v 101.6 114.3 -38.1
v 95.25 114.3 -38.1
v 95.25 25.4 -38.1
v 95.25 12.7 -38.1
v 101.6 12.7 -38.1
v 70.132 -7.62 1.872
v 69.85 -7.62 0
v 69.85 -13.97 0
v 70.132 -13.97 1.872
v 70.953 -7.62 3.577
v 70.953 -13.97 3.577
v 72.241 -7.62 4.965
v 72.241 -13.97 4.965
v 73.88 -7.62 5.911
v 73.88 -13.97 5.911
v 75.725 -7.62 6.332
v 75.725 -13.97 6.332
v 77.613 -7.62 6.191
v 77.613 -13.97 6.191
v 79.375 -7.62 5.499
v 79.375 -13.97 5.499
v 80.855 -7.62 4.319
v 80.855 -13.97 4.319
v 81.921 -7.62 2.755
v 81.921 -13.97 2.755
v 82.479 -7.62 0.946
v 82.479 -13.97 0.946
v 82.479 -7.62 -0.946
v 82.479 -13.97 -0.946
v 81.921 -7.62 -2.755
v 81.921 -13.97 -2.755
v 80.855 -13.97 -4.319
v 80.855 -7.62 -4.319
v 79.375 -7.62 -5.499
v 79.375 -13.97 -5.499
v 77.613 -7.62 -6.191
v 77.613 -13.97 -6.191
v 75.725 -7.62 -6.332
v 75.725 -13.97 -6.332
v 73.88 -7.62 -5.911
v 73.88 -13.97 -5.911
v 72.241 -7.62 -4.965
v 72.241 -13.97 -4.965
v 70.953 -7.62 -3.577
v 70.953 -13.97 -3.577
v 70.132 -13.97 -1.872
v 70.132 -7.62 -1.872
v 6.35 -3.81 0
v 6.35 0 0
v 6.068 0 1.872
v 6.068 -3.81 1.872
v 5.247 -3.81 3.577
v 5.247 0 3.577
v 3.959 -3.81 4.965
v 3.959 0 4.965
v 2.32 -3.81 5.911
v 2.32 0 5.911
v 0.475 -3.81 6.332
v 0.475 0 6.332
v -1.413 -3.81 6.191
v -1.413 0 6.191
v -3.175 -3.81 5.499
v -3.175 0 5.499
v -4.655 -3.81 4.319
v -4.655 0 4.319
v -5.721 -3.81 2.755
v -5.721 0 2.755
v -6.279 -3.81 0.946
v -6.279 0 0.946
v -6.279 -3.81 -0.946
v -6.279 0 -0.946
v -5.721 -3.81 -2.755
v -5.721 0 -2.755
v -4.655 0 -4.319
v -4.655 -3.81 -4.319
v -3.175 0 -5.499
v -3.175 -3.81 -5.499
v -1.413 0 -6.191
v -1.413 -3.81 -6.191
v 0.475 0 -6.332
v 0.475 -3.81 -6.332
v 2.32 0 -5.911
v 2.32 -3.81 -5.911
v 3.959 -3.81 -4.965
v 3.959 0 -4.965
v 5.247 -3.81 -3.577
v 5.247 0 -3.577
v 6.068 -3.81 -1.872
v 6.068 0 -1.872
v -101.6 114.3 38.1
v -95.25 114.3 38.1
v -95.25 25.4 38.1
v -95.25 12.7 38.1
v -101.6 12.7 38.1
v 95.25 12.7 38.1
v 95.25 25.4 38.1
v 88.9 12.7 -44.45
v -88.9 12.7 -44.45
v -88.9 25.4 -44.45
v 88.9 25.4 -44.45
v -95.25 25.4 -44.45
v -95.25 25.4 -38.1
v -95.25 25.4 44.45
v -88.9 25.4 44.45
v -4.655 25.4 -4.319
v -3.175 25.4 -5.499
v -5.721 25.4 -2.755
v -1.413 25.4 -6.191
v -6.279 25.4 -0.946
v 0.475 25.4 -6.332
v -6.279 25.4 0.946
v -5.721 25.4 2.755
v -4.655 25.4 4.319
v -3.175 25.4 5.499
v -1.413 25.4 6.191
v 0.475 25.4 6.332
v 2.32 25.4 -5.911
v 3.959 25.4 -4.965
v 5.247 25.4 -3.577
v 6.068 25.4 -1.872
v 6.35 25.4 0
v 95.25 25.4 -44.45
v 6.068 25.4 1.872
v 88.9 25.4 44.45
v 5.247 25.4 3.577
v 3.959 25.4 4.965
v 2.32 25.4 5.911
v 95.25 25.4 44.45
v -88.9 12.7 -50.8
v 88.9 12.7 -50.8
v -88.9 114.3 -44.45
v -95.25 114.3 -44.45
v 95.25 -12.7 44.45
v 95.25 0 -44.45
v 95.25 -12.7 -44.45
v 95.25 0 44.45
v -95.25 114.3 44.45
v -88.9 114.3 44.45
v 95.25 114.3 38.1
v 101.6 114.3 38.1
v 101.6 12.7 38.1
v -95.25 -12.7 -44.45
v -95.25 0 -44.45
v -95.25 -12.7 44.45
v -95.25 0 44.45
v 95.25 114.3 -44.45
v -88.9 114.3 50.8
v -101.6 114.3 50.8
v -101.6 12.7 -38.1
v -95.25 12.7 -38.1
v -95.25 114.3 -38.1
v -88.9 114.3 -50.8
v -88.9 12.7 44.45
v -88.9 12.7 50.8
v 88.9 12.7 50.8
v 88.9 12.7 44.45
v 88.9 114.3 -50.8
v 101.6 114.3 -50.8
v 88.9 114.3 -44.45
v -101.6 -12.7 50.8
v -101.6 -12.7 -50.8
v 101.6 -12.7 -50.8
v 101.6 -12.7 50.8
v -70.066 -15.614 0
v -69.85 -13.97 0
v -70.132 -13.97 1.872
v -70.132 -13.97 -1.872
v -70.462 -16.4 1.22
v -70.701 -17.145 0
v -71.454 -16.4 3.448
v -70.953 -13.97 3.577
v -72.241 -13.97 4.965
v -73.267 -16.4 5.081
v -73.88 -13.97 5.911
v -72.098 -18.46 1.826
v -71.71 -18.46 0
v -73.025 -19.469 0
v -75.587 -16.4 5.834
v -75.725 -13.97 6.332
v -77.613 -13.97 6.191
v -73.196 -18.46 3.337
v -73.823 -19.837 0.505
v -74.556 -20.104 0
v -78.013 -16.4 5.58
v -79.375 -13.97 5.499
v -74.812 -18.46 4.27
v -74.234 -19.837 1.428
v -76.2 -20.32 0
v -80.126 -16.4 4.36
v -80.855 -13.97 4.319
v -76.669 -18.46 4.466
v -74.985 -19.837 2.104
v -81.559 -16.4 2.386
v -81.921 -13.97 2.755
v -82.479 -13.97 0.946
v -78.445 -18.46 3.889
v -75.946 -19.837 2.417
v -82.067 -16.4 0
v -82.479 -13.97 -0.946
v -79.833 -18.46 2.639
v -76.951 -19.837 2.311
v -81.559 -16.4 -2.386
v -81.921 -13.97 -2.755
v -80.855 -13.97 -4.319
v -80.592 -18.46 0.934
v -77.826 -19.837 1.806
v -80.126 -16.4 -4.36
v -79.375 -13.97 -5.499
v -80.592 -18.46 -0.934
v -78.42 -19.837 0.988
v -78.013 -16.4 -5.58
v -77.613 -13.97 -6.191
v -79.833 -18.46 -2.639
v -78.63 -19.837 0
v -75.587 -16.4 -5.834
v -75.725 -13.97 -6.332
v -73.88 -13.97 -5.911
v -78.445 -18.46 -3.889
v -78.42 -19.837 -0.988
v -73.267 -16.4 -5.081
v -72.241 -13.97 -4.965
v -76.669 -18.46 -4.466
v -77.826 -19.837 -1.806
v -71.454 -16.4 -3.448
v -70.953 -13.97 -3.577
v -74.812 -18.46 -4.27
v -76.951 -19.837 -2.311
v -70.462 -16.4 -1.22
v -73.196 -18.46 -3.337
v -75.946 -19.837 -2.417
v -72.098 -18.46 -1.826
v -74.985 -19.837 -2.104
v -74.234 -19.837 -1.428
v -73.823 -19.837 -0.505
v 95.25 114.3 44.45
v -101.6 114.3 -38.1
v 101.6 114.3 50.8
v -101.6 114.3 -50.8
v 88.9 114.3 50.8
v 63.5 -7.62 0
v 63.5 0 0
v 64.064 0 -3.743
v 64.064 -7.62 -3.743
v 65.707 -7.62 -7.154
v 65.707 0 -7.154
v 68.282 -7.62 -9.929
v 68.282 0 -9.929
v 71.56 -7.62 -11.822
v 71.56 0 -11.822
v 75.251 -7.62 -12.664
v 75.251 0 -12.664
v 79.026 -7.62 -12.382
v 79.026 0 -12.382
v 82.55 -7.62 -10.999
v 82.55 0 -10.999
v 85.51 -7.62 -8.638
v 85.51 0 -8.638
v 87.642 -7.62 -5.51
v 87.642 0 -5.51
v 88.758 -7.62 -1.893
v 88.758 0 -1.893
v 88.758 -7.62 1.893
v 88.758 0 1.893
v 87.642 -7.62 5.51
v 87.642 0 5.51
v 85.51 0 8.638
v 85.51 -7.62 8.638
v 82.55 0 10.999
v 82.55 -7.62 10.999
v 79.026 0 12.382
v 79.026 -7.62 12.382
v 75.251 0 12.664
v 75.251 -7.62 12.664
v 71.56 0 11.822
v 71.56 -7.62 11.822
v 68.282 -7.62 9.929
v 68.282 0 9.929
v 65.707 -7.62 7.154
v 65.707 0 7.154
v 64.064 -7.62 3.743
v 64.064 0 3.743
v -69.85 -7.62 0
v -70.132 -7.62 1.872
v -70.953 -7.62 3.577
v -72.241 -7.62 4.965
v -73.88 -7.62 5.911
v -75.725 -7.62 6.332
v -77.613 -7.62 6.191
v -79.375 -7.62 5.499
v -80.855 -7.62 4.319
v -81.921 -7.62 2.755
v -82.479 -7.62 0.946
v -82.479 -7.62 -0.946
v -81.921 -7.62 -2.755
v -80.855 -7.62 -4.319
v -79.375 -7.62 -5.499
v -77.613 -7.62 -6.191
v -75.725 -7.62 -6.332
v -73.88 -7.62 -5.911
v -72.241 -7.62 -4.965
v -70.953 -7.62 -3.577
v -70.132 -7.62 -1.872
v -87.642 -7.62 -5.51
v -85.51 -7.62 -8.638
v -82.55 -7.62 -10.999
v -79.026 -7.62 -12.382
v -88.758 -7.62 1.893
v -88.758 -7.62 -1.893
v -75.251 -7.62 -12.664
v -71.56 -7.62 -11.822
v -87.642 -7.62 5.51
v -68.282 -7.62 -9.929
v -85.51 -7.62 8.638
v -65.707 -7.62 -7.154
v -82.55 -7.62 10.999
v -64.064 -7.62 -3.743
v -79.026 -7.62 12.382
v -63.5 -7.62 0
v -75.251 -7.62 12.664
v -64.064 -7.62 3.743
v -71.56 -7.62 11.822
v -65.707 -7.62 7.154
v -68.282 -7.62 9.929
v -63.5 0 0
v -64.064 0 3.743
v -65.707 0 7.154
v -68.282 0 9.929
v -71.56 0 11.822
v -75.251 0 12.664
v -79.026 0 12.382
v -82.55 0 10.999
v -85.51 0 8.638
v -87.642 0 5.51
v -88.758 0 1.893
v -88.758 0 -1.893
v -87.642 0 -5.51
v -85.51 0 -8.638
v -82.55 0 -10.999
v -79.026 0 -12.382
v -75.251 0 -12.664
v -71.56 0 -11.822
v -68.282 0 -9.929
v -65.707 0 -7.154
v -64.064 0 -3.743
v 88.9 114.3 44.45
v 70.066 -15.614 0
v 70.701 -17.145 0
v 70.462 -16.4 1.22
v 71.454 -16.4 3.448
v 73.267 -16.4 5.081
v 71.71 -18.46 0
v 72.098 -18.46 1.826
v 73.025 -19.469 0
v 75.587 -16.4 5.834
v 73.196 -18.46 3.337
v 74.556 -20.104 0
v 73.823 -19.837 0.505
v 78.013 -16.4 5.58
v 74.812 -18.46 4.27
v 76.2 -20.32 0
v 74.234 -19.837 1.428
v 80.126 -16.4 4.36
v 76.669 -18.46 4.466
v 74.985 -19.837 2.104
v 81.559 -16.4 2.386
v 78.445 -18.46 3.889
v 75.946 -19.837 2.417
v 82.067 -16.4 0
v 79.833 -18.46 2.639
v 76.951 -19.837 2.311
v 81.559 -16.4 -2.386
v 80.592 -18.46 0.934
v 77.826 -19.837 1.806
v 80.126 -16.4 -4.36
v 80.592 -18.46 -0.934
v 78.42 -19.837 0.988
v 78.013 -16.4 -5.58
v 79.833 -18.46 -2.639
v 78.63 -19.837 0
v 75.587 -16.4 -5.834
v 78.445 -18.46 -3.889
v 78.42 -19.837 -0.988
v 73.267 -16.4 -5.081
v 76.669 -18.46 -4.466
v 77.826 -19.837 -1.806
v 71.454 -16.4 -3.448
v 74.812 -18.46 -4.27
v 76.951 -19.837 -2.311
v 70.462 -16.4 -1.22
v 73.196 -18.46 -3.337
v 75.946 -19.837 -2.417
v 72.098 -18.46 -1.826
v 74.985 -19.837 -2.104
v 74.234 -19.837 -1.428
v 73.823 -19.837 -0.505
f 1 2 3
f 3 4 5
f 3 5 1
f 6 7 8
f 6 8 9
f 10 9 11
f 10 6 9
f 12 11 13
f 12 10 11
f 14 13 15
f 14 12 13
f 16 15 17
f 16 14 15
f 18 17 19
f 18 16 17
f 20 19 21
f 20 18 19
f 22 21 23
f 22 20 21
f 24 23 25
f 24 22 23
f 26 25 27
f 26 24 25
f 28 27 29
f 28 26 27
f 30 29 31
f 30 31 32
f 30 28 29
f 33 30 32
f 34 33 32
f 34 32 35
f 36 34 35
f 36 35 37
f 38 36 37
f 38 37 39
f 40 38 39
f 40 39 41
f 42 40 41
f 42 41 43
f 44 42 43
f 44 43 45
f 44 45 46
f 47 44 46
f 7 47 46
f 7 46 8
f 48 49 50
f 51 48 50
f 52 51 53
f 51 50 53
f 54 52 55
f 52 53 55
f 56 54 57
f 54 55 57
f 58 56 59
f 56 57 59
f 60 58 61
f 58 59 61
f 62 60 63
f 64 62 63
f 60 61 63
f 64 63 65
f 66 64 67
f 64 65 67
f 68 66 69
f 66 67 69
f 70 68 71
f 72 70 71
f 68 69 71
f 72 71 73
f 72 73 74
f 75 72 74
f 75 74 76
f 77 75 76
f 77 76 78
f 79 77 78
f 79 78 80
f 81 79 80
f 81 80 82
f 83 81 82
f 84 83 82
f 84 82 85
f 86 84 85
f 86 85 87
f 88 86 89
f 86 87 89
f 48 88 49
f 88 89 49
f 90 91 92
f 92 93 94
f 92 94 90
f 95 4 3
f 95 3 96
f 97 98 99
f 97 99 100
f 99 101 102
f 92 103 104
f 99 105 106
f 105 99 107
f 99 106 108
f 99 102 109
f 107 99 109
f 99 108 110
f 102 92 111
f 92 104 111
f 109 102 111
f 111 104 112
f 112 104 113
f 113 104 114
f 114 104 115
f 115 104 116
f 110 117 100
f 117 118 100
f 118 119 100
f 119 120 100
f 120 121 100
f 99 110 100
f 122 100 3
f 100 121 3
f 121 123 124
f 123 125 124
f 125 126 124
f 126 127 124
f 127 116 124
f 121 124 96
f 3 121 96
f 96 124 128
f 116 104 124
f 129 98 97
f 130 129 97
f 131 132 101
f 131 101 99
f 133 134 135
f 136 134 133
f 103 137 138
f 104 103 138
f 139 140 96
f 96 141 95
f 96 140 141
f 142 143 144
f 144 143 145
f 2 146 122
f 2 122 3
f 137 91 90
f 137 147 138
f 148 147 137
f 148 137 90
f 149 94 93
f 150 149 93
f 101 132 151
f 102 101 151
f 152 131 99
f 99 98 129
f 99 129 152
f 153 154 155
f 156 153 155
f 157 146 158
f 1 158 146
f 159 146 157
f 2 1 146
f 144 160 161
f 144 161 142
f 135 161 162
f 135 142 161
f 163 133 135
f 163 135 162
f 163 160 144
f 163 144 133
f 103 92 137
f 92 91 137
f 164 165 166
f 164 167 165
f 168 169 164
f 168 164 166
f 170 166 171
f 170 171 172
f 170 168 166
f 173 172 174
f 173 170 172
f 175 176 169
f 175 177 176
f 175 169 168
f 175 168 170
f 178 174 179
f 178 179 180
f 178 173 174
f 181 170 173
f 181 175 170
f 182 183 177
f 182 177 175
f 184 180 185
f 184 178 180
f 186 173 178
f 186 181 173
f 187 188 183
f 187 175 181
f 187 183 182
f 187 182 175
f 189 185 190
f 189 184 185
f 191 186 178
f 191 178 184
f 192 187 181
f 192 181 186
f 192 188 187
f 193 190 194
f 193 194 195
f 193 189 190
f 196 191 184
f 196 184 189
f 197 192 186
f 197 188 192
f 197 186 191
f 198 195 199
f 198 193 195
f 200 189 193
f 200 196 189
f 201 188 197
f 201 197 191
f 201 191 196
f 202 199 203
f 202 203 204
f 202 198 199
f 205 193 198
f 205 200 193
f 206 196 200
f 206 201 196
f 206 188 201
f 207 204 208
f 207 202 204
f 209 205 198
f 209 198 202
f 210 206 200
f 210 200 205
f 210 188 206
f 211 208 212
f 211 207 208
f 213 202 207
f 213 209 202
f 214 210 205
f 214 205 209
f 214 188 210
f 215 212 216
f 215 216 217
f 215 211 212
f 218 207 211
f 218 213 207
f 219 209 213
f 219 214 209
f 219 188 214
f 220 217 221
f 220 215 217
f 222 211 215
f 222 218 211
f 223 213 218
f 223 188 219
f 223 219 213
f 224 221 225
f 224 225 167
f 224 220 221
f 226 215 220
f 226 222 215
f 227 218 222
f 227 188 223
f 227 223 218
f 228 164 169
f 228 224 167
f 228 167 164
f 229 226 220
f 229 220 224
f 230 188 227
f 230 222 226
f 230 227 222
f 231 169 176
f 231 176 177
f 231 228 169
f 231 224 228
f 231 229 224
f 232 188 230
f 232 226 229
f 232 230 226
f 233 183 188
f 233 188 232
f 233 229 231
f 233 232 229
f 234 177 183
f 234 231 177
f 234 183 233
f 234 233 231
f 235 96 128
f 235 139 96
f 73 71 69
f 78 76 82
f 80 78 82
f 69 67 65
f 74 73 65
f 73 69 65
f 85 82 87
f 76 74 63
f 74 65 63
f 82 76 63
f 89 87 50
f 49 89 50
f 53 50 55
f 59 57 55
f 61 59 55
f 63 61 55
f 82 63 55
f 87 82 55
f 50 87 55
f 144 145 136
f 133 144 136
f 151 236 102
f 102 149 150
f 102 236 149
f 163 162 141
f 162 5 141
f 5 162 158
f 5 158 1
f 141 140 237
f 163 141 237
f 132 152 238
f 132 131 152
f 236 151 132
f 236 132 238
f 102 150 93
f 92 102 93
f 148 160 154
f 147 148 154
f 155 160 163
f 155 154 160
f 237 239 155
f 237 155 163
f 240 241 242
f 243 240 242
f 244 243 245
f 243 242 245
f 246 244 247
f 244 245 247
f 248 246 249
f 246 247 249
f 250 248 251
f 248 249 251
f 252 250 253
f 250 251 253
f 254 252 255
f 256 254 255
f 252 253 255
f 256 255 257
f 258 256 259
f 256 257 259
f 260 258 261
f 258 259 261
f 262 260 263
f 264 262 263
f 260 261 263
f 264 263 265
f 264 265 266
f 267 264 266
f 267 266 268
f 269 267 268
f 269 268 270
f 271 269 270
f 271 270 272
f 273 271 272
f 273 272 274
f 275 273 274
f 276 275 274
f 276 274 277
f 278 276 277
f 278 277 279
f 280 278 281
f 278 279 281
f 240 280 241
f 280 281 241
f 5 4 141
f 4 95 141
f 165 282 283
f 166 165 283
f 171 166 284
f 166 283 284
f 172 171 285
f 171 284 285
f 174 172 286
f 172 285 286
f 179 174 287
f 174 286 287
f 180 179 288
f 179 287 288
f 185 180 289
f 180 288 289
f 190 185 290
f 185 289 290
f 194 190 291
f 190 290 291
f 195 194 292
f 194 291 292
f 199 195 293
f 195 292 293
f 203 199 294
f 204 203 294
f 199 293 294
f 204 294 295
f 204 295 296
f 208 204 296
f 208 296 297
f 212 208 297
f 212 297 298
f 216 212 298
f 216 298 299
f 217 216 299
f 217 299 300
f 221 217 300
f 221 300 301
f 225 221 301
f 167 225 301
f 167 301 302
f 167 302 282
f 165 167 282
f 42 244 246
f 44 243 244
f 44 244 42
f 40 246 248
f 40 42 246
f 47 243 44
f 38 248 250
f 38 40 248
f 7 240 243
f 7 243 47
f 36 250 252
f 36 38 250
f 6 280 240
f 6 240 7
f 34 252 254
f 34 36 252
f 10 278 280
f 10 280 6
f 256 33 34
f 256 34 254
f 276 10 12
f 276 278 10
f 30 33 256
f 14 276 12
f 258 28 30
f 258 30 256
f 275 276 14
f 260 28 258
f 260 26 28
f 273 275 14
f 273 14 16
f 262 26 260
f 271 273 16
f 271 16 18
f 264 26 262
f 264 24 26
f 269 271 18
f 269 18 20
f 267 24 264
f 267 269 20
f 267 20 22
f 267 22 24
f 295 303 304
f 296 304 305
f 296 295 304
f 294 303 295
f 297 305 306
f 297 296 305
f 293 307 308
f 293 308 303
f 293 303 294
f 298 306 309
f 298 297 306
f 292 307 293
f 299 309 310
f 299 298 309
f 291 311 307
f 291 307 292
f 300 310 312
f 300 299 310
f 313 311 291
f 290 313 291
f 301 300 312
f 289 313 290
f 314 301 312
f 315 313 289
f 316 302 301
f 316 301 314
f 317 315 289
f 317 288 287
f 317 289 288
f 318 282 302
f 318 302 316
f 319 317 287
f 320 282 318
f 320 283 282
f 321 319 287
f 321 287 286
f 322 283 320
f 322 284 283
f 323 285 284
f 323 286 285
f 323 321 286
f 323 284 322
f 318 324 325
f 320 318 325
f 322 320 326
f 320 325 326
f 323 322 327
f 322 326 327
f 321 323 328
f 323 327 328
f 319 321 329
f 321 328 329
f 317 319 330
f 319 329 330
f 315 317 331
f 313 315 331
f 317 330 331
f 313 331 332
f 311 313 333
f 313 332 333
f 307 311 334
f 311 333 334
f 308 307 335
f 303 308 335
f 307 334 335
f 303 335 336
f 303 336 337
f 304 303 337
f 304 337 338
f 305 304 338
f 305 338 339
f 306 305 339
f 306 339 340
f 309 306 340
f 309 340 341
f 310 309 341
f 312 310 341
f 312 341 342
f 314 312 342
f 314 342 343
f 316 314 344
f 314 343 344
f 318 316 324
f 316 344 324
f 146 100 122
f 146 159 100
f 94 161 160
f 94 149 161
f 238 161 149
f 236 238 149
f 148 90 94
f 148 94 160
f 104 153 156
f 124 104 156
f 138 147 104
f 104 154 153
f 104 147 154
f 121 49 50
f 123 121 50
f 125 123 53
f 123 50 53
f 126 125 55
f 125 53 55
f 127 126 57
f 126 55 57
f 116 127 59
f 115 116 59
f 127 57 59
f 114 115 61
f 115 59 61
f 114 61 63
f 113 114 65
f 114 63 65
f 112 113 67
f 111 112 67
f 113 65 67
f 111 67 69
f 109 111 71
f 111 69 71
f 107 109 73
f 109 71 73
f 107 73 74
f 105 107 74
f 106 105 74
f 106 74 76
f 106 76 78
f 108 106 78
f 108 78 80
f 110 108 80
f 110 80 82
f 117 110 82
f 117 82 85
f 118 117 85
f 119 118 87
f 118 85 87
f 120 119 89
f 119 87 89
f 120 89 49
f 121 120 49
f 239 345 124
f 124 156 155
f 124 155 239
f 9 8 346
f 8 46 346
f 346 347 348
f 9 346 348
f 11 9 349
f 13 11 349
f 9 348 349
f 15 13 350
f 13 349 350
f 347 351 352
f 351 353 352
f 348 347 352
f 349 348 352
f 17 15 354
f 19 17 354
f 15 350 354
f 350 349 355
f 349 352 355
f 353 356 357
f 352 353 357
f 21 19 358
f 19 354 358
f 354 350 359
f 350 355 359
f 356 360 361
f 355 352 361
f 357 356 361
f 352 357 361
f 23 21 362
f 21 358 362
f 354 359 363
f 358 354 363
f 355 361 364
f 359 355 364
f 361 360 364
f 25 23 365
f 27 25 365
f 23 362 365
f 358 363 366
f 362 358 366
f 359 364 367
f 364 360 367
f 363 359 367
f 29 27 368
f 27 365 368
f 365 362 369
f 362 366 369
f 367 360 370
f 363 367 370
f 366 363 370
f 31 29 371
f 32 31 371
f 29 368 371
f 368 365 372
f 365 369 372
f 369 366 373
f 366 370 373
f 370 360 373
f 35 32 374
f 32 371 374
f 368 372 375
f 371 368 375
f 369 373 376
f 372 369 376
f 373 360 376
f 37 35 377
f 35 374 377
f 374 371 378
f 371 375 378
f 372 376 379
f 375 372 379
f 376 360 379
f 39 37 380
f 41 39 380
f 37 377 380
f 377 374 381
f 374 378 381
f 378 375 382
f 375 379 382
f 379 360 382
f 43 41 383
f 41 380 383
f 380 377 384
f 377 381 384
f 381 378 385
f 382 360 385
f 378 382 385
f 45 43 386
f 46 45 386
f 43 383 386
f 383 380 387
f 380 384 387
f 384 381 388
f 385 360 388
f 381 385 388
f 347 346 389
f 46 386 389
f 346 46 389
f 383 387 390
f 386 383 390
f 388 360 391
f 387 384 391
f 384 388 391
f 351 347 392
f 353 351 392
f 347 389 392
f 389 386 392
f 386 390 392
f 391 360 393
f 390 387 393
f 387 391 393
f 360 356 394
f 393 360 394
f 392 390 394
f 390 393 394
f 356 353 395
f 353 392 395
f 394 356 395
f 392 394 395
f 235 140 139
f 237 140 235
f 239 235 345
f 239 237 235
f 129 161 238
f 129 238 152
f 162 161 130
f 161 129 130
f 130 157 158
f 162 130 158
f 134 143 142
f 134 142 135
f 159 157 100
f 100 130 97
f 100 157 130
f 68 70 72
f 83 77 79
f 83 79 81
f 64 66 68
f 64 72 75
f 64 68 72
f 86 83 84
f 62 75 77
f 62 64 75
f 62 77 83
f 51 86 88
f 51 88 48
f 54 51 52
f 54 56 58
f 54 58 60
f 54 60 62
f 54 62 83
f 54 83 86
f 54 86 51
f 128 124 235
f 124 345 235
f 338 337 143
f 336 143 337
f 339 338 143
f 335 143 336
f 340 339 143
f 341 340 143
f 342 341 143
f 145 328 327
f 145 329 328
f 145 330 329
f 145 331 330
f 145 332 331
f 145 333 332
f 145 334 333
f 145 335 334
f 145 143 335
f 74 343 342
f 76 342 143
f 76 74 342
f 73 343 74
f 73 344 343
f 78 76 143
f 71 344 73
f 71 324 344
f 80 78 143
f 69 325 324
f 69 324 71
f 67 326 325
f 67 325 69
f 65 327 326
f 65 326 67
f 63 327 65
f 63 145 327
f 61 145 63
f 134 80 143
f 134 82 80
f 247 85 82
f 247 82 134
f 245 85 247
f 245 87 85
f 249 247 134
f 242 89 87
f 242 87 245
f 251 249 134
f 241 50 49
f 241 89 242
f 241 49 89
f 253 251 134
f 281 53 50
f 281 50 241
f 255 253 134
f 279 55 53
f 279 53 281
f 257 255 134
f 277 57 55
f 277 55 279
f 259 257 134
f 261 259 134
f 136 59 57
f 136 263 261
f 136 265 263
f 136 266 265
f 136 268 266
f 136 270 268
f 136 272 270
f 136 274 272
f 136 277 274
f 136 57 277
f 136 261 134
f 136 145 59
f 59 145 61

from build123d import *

# Parameters (mm, degrees)
F0_W     = 203.2
F0_H     = 101.6
F0_W_2   = 190.5
F0_H_2   = 88.9
F1_DEPTH = 12.7
F3_DEPTH = 101.6
F4_DEPTH = 12.7
F0_R     = 6.35
F5_DEPTH = 25.4
F6_DEPTH = 3.81
F7_R     = 12.7
F7_R_2   = 6.35
F8_DEPTH = 7.62
F9_DEPTH = 20.32
F10_R    = 6.35


with BuildPart() as f1:
    # F0 (on Front) → F1 (new body)
    with BuildSketch(Plane.XZ):
        Rectangle(F0_W, F0_H)
        Rectangle(F0_W_2, F0_H_2, mode=Mode.SUBTRACT)
    extrude(amount=-F1_DEPTH)

    # F2 (on face) → F3 (join)
    with BuildSketch(Plane(origin=(0, 12.7, 0), x_dir=(-1, 0, 0), z_dir=(0, 1, 0))):
        Polygon((88.9, -50.8), (101.6, -50.8), (101.6, -38.1), (95.25, -38.1), (95.25, -44.45), (88.9, -44.45), align=None)
        Polygon((-101.6, -50.8), (-88.9, -50.8), (-88.9, -44.45), (-95.25, -44.45), (-95.25, -38.1), (-101.6, -38.1), align=None)
        Polygon((-101.6, 50.8), (-101.6, 38.1), (-95.25, 38.1), (-95.25, 44.45), (-88.9, 44.45), (-88.9, 50.8), align=None)
        Polygon((95.25, 38.1), (101.6, 38.1), (101.6, 50.8), (88.9, 50.8), (88.9, 44.45), (95.25, 44.45), align=None)
    extrude(amount=F3_DEPTH)

    # F0 (on Front) → F4 (join)
    with BuildSketch(Plane.XZ):
        Rectangle(F0_W, F0_H)
        Rectangle(F0_W_2, F0_H_2, mode=Mode.SUBTRACT)
    extrude(amount=F4_DEPTH)

    # F0 (on Front) → F5 (join)
    with BuildSketch(Plane.XZ):
        Rectangle(F0_W_2, F0_H_2)
        Circle(F0_R, mode=Mode.SUBTRACT)
    extrude(amount=-F5_DEPTH)

    # F7 (on Front) → F8 (join)
    with BuildSketch(Plane.XZ):
        with Locations((-76.2, 0)):
            Circle(F7_R)
        with Locations((-76.2, 0)):
            Circle(F7_R_2, mode=Mode.SUBTRACT)
        with BuildLine():
            ThreePointArc((88.9, 0), (76.2, 12.7), (63.5, 0))
            ThreePointArc((63.5, 0), (76.2, -12.7), (88.9, 0))
        make_face()
        with BuildLine():
            ThreePointArc((82.55, 0), (76.2, -6.35), (69.85, 0))
            ThreePointArc((69.85, 0), (76.2, 6.35), (82.55, 0))
        make_face(mode=Mode.SUBTRACT)
    extrude(amount=F8_DEPTH)

    # F9 (add): faces of the model
    f9_faces = [f1.faces().sort_by_distance(p)[0] for p in [
        (-76.2, 0, 0),
        (76.2, 0, 0),
    ]]
    extrude(f9_faces, amount=F9_DEPTH)

    # F10
    f10_edges = [f1.edges().sort_by_distance(p)[0] for p in [
        (-82.55, -20.32, 0),
        (82.55, -20.32, 0),
    ]]
    fillet(f10_edges, radius=F10_R)


with BuildPart() as f6:
    # F0 (on Front) → F6 (new body)
    with BuildSketch(Plane.XZ):
        Circle(F0_R)
    extrude(amount=F6_DEPTH)


solid = Compound([f1.part, f6.part])
